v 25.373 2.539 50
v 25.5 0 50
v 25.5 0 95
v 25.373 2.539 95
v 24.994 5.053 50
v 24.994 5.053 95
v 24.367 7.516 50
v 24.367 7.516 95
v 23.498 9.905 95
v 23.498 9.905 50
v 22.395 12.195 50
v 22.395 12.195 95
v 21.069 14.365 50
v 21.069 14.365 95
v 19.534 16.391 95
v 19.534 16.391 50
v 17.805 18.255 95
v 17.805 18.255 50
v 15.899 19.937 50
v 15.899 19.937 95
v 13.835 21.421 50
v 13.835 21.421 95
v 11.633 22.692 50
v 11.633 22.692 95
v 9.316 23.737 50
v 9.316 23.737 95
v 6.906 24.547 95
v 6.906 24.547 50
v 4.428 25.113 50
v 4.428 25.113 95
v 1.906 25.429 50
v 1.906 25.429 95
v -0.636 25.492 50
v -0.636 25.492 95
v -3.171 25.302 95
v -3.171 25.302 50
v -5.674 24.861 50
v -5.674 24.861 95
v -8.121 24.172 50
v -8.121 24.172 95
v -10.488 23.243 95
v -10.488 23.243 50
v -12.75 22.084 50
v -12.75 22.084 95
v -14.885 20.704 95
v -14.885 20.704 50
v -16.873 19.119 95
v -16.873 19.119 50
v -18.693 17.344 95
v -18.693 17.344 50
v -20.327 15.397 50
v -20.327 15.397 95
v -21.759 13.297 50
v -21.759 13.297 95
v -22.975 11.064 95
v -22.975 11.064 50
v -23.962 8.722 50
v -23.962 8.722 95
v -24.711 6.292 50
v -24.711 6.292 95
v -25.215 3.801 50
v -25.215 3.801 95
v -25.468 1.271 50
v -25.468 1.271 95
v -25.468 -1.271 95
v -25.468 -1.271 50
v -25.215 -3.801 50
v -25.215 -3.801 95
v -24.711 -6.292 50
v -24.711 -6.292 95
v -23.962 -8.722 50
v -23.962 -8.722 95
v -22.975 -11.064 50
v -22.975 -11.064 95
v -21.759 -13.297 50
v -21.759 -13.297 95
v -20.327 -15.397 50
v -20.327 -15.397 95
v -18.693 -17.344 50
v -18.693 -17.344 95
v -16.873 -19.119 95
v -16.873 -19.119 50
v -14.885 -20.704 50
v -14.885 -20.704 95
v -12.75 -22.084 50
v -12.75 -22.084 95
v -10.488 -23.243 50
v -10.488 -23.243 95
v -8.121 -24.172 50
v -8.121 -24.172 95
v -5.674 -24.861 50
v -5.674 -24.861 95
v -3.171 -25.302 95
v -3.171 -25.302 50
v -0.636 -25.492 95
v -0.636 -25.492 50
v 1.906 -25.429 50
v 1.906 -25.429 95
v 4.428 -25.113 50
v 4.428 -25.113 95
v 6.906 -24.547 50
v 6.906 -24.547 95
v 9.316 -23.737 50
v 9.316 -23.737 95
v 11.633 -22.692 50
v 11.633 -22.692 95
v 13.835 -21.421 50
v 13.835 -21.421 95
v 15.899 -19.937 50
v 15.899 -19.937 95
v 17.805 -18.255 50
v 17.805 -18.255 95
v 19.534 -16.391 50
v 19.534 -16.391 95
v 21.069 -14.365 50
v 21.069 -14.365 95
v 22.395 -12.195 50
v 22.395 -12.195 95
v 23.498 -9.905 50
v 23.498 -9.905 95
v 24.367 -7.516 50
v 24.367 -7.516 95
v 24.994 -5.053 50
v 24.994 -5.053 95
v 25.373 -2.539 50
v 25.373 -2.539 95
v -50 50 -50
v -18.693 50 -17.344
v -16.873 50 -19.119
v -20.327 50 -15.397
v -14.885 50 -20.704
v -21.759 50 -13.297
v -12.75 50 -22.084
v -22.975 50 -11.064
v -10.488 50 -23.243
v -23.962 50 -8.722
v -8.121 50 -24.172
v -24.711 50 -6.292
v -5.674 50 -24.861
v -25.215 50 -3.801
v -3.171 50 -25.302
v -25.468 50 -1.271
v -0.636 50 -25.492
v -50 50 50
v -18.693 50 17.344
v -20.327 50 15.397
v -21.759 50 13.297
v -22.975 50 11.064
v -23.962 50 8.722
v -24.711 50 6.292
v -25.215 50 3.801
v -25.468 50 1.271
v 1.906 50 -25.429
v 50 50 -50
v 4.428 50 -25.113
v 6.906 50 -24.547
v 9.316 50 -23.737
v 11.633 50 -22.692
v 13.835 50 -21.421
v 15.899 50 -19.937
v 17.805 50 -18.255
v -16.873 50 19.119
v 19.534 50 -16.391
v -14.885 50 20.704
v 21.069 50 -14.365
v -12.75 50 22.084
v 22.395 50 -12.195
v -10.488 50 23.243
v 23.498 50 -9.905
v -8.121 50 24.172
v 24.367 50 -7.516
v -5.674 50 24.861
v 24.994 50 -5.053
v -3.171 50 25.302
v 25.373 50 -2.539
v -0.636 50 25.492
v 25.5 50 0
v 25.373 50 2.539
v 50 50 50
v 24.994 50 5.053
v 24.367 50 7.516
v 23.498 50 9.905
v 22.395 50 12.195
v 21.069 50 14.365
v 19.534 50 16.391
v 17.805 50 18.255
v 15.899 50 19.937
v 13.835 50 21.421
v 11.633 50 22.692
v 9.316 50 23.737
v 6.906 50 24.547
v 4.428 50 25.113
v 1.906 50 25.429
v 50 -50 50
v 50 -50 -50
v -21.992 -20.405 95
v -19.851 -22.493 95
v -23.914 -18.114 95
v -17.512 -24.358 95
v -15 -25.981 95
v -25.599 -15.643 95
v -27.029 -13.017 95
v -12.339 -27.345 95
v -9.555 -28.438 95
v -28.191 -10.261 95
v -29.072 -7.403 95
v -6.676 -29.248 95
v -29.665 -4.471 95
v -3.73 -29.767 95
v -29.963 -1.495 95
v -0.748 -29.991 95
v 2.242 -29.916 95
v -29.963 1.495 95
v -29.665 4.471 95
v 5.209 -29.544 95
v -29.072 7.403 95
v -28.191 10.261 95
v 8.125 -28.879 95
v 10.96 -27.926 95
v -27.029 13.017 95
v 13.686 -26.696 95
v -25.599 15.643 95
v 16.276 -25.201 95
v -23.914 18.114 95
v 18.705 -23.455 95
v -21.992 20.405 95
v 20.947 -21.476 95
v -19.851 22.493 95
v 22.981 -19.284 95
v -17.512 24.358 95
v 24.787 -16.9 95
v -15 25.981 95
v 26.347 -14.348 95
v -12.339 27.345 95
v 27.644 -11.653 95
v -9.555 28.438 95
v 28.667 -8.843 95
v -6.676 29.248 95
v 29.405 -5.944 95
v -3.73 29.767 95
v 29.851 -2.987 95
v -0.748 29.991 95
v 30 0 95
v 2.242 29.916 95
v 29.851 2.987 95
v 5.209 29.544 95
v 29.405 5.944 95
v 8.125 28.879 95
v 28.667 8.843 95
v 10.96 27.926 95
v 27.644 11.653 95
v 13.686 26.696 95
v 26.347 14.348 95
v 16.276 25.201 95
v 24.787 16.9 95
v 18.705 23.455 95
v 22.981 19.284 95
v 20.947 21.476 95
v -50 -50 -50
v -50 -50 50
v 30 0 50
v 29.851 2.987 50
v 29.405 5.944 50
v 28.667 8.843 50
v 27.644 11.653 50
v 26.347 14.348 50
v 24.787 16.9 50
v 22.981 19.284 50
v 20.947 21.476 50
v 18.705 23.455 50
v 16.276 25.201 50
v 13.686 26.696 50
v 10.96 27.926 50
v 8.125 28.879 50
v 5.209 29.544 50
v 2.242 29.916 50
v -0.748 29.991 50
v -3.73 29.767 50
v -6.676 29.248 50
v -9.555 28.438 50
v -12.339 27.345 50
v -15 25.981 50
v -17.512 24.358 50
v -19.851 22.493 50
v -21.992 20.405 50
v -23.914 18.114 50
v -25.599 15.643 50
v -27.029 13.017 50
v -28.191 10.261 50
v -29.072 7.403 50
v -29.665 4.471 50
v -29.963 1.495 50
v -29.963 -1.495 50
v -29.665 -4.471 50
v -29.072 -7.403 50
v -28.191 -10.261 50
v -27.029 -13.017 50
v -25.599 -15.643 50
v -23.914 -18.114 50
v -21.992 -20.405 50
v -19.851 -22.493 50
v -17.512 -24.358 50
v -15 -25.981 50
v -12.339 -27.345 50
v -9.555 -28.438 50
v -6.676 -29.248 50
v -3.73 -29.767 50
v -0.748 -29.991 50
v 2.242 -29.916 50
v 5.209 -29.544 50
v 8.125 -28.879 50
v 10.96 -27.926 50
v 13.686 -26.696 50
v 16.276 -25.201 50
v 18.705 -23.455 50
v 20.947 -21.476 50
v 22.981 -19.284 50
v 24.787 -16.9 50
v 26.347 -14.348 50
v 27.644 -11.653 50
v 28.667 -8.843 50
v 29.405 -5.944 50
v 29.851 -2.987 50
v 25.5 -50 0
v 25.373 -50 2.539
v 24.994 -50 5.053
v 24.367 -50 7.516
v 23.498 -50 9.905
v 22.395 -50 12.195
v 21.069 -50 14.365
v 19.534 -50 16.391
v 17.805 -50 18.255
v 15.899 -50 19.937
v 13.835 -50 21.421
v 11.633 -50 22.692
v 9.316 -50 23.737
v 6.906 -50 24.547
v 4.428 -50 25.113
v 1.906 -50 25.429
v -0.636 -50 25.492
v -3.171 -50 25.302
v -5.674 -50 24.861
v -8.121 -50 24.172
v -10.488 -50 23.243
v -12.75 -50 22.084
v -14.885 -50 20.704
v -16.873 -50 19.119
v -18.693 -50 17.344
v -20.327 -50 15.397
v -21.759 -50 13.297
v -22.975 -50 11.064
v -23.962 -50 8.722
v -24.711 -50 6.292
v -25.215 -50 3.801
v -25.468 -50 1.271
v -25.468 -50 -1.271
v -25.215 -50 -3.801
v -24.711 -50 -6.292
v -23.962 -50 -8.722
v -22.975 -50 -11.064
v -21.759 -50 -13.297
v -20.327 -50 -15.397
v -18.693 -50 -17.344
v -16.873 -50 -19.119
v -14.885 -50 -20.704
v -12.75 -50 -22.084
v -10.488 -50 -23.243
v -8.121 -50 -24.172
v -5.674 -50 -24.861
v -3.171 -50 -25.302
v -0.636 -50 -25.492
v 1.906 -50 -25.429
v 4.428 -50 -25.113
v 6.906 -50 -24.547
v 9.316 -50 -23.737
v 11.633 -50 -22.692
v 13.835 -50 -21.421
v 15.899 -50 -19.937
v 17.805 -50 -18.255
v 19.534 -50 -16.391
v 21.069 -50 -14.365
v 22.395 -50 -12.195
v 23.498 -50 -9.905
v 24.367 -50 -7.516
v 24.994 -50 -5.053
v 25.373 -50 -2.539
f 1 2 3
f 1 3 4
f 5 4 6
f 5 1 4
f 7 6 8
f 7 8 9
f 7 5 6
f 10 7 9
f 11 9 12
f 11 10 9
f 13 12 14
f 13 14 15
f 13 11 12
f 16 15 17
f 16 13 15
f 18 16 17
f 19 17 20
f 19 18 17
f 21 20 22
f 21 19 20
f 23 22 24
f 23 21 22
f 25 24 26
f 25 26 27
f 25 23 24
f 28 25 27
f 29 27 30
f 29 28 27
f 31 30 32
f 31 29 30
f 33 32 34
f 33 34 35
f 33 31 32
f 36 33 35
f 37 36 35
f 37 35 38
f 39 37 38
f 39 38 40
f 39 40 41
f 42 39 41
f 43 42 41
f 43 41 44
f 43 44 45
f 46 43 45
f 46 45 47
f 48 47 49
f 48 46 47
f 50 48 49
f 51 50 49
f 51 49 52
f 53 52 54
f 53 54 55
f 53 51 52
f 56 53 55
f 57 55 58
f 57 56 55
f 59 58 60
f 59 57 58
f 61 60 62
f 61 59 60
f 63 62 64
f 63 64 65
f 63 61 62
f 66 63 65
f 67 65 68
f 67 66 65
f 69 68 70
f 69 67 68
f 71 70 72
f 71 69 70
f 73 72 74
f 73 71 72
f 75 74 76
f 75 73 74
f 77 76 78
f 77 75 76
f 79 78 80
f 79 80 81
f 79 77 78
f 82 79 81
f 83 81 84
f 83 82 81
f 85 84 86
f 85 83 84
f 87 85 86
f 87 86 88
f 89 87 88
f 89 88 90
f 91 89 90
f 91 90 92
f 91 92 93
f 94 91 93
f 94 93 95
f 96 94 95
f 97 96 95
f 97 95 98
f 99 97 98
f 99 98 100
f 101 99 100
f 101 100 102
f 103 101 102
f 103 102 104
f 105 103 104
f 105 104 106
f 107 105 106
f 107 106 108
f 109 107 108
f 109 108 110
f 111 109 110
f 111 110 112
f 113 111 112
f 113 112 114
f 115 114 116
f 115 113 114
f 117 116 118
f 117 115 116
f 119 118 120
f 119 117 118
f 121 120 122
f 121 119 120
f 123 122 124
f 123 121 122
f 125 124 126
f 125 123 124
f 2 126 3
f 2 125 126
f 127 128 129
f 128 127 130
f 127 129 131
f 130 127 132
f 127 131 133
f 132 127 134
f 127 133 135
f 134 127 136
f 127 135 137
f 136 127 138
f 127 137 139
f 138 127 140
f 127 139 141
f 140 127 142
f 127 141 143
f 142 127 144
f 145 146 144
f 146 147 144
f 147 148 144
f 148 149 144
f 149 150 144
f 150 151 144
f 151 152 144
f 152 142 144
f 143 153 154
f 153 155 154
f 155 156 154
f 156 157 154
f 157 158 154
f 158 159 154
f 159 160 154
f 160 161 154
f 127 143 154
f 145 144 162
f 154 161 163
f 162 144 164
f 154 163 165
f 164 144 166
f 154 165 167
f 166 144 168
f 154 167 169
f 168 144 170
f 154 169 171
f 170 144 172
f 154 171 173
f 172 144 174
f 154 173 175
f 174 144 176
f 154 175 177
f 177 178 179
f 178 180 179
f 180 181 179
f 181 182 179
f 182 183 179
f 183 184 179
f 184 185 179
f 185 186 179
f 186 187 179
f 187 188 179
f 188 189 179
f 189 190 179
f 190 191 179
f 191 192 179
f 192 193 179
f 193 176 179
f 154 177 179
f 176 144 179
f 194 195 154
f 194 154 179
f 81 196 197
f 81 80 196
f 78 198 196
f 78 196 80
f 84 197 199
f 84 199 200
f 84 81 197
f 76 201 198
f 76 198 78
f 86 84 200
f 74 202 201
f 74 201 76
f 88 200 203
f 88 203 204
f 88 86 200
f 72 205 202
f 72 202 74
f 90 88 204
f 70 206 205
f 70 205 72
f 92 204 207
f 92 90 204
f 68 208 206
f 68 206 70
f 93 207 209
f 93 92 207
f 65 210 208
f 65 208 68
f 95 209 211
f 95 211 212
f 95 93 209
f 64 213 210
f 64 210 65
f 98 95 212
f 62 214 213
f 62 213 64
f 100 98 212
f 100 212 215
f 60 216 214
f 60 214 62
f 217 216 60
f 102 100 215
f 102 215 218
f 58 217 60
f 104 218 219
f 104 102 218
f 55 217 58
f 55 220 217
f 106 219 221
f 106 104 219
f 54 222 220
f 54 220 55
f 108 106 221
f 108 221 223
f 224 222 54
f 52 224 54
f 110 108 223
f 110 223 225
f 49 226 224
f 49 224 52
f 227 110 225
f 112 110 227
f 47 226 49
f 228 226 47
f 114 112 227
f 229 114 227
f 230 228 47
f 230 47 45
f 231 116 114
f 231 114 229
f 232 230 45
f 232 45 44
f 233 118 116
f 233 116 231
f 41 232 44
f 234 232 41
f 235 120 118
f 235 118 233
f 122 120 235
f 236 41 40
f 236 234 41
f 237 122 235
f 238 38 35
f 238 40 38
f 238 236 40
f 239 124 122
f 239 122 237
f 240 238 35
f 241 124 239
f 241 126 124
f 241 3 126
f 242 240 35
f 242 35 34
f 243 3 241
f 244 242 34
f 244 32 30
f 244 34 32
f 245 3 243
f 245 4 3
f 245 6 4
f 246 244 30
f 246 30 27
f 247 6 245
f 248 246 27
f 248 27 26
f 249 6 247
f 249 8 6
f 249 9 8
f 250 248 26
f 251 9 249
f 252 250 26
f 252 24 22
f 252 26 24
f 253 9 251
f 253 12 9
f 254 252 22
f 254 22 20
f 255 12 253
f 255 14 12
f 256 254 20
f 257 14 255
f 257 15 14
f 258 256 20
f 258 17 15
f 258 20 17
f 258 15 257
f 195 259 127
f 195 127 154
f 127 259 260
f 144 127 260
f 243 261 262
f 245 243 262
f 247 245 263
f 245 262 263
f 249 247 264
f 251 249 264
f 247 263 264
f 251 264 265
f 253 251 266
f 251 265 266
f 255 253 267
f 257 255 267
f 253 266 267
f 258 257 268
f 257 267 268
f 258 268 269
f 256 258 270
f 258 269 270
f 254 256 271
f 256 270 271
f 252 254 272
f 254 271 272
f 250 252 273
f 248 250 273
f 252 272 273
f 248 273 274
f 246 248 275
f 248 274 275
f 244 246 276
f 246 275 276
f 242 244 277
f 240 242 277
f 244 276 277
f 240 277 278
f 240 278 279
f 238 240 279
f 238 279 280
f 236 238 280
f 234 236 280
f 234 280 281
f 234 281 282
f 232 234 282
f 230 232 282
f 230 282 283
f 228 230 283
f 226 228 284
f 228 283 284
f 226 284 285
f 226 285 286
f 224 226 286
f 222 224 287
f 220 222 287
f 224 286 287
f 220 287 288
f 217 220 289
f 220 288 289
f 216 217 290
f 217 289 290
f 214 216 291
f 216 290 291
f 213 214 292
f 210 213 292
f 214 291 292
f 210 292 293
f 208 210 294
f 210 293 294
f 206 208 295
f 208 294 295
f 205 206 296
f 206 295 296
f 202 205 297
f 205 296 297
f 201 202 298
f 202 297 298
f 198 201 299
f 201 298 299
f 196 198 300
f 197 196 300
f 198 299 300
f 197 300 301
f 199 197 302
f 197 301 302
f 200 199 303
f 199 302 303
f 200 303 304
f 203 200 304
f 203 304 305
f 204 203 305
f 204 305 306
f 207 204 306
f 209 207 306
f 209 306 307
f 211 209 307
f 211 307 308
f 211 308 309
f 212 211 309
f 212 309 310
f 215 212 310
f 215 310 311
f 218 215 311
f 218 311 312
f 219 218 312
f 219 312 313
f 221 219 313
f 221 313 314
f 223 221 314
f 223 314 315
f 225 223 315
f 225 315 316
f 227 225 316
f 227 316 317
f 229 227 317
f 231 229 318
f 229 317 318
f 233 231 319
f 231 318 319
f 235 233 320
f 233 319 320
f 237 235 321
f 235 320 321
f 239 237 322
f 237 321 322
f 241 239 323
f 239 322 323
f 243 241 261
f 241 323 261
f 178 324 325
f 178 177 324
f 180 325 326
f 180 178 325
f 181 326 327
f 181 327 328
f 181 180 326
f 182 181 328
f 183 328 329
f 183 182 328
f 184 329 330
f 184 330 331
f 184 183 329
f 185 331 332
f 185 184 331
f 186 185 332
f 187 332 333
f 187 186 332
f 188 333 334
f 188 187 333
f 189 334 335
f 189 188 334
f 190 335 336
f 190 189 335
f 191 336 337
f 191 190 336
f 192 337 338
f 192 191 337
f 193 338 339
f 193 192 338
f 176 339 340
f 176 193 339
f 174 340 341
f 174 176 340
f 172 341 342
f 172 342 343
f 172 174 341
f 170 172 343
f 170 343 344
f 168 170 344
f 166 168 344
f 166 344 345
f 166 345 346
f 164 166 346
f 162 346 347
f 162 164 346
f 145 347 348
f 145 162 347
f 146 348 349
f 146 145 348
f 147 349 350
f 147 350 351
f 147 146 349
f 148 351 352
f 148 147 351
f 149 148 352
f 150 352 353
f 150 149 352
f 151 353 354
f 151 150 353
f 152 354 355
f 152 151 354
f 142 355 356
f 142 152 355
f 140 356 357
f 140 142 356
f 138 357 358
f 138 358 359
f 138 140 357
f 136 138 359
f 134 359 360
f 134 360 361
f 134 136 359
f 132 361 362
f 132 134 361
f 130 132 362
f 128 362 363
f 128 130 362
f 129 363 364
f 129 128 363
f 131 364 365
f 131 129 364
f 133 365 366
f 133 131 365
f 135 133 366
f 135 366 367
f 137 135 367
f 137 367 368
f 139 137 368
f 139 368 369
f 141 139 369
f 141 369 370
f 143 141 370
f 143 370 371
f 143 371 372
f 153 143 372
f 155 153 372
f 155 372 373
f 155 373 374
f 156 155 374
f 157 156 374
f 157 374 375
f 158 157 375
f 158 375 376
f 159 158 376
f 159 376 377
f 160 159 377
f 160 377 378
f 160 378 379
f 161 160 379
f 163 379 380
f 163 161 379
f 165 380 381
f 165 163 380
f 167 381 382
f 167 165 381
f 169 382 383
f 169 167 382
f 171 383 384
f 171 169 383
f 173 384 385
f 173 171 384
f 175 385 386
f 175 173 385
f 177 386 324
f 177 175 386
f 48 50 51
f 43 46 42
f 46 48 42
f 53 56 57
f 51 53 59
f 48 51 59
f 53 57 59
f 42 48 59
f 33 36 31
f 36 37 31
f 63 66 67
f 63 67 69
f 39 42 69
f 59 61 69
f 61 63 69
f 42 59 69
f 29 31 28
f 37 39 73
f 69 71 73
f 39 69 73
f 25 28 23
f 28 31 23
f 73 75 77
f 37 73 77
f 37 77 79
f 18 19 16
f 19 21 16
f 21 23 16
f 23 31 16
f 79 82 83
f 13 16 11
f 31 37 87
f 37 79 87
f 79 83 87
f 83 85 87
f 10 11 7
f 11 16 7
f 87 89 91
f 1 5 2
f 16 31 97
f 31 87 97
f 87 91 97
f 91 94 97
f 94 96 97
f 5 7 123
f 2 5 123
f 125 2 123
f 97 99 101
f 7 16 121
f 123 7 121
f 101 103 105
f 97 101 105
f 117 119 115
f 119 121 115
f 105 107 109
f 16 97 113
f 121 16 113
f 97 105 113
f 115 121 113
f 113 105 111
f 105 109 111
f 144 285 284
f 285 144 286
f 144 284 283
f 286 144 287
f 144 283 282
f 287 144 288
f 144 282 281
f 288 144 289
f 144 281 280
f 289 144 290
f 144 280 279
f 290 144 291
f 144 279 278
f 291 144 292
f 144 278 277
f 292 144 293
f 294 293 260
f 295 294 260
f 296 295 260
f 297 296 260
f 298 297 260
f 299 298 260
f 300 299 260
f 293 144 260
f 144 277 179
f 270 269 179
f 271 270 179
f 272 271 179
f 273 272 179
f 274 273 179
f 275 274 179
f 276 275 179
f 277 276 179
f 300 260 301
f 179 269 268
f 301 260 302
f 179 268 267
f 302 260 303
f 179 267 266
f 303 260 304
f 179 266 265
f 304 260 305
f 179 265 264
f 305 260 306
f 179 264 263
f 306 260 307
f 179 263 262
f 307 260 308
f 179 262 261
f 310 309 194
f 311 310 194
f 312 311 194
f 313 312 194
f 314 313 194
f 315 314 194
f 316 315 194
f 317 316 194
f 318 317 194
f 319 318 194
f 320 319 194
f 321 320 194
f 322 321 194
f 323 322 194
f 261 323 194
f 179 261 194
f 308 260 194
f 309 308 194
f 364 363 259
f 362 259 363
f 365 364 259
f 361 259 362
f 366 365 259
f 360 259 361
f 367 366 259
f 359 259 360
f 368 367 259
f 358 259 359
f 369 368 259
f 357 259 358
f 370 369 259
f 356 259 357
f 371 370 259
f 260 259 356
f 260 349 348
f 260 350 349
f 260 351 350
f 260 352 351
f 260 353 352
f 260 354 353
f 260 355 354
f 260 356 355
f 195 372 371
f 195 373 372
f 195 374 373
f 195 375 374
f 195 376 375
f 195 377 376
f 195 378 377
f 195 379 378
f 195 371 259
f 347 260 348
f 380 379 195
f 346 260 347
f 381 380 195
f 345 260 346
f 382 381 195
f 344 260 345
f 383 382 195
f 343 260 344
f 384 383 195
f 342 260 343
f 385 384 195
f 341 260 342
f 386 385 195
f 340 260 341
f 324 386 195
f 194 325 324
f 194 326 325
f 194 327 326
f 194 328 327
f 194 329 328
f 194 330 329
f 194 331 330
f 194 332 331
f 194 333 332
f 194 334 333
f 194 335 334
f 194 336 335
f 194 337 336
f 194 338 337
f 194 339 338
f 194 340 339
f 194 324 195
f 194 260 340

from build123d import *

# Parameters (mm, degrees)
F0_W     = 100
F0_H     = 100
F0_R     = 25.5
F1_DEPTH = 50
F2_R     = 30
F2_R_2   = 25.5
F3_DEPTH = 45


with BuildPart() as f1:
    # F0 (on Front) → F1 (new body, symmetric)
    with BuildSketch(Plane.XZ):
        Rectangle(F0_W, F0_H)
        Circle(F0_R, mode=Mode.SUBTRACT)
    extrude(amount=F1_DEPTH, both=True)

    # F2 (on face) → F3 (join)
    with BuildSketch(Plane.XY.offset(50)):
        Circle(F2_R)
        Circle(F2_R_2, mode=Mode.SUBTRACT)
    extrude(amount=F3_DEPTH)


solid = f1.part
